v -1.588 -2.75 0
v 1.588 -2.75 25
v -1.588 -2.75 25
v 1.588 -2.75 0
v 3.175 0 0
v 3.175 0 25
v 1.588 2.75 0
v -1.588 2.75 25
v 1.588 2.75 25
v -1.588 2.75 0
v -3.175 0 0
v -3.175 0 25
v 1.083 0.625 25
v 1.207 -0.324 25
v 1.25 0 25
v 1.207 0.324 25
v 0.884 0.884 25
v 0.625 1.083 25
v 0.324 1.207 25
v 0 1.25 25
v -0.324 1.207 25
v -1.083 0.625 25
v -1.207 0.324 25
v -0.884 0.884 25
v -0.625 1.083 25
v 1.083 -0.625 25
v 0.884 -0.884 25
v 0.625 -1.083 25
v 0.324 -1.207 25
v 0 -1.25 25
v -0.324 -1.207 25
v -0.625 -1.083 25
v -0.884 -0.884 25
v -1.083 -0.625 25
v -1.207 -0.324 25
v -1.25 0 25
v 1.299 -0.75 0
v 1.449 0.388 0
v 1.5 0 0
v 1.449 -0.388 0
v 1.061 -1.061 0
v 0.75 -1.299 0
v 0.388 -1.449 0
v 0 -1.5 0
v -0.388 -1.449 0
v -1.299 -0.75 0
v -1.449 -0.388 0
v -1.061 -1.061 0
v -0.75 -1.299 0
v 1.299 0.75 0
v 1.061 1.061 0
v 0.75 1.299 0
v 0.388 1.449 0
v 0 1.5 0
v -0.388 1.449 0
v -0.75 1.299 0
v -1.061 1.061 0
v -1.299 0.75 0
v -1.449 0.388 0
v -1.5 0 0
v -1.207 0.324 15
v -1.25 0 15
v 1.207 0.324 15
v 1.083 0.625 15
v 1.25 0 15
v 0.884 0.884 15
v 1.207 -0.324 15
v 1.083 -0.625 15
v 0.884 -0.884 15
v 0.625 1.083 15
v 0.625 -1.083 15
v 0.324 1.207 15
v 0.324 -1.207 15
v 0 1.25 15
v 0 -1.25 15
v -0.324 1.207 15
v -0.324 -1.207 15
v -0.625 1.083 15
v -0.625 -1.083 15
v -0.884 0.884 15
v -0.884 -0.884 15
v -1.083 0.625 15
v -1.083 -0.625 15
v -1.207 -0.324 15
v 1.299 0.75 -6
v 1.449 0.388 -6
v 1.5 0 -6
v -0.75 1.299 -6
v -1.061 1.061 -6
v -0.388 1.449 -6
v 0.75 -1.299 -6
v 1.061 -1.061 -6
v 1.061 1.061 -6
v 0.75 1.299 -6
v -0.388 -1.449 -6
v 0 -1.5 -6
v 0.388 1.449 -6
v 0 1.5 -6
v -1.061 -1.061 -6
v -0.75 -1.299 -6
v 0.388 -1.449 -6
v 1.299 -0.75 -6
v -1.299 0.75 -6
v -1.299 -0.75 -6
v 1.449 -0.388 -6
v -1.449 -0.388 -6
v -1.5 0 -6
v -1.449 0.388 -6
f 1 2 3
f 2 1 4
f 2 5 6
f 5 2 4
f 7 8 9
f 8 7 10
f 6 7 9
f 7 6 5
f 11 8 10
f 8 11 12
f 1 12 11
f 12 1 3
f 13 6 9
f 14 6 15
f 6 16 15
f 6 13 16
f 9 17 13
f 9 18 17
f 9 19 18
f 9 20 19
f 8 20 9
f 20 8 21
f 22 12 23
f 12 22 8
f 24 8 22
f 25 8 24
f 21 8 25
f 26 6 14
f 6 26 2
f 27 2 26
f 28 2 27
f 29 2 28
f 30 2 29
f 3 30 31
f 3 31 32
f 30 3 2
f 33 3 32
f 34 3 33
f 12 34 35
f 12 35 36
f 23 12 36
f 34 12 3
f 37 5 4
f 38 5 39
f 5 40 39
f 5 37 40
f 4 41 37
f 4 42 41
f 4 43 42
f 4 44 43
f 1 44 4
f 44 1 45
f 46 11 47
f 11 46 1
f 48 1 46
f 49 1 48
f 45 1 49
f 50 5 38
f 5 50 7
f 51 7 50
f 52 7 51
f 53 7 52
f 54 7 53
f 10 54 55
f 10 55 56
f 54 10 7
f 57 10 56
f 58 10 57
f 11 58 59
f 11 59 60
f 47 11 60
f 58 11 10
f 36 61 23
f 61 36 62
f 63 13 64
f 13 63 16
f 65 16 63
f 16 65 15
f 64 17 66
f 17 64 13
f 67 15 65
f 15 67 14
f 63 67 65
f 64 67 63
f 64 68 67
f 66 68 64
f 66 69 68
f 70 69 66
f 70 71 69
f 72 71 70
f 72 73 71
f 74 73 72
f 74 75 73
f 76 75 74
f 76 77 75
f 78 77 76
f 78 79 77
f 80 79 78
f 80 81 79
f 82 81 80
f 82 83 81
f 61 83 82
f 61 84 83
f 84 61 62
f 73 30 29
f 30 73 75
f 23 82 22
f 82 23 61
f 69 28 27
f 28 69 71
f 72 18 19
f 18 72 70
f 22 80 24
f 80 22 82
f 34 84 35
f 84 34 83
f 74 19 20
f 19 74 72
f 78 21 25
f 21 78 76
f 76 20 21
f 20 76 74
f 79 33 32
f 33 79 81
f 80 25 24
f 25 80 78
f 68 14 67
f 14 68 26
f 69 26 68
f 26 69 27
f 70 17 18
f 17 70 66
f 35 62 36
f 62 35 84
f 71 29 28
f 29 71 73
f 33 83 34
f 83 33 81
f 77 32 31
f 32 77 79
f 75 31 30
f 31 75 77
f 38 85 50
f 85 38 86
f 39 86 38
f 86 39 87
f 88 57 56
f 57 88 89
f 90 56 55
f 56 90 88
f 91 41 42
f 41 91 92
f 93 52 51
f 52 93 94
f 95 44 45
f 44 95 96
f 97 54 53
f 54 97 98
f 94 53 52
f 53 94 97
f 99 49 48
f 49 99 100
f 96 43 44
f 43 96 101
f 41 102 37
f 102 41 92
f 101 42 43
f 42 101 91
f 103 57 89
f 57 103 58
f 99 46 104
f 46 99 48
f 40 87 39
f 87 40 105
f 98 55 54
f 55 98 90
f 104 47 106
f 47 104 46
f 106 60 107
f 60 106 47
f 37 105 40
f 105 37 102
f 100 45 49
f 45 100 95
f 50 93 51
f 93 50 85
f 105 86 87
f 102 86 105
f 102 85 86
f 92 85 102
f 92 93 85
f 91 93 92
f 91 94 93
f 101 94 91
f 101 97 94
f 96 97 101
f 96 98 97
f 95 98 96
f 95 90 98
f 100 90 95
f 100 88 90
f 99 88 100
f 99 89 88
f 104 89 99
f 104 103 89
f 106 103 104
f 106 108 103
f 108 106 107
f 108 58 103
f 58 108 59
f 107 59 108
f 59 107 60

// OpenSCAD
// =====================================================================
// hex_spacer.scad — 六角スペーサ 簡易モデル (購入品)
//
// 親機・子機内装で使う市販スペーサのプレースホルダ。印刷対象ではない。
//   kind = "mf" : オス-メス (胴 +Z、オスねじ -Z)
//   kind = "ff" : メス-メス (胴だけ。両端にメスねじ)
//
//   m3_mf25 : P-MAIN 取付穴 ×4 → parent_lipo_tray / p2 の TX 高架 ×4
//   m3_mf32 / m3_mf17 : C-MAIN 取付穴に立てて child_lcd_support アーチを受ける
//                       (オスは基板穴 Ø3.2 を通って child_vtray_deck のボス下穴へ)
//   m3_mf10 : WTE4 下フランジ BCD94 の M3 穴に立て、child_vtray_deck のラグを受ける
//   m2_ff6  : child_vtray_deck 下面 ↔ RX_improved_mini (Ø2.2 穴、M2 ねじ両側)
//
// 原点: 六角胴の下端面中心。胴は +Z、オスねじは -Z へ伸びる。
// 寸法は一般的な黄銅六角スペーサ (廣杉計器 BSB/ASB 系相当) の公称値。
// =====================================================================

/* [呼び] */
size    = 3;      // ねじ呼び (2, 3, 4)
body_l  = 25;     // 六角胴の長さ
stud_l  = 6;      // オスねじ長 (M2 は 4, M3 は 6, M4 は 8 が標準)。ff では無視
kind    = "mf";   // [mf, ff]

/* [導出 (JIS 二面幅)] */
af      = size == 2 ? 4 : size == 3 ? 5.5 : 7;      // 二面幅
bore_d  = size == 2 ? 1.6 : size == 3 ? 2.5 : 3.3;  // メスねじ下穴 (表示用)
bore_l  = min(body_l, size == 2 ? 5 : 10);          // メスねじ深さ (表示用)

$fn = 6;

assert(body_l > 0, "長さが不正");
assert(kind == "ff" || stud_l > 0, "mf にはオスねじ長が要る");

difference() {
    // 六角胴 (二面幅 af → 外接円径 af/cos30)
    cylinder(d = af / cos(30), h = body_l);
    // 上端のメスねじ
    translate([0, 0, body_l - bore_l]) cylinder(d = bore_d, h = bore_l + 1, $fn = 24);
    // ff は下端にもメスねじ
    if (kind == "ff") translate([0, 0, -1]) cylinder(d = bore_d, h = bore_l + 1, $fn = 24);
}
// オスねじ
if (kind == "mf")
    translate([0, 0, -stud_l]) cylinder(d = size, h = stud_l + 0.01, $fn = 24);

echo(str("hex_spacer M", size, " ", kind, " body ", body_l, " stud ", kind == "mf" ? stud_l : 0, " af ", af));
